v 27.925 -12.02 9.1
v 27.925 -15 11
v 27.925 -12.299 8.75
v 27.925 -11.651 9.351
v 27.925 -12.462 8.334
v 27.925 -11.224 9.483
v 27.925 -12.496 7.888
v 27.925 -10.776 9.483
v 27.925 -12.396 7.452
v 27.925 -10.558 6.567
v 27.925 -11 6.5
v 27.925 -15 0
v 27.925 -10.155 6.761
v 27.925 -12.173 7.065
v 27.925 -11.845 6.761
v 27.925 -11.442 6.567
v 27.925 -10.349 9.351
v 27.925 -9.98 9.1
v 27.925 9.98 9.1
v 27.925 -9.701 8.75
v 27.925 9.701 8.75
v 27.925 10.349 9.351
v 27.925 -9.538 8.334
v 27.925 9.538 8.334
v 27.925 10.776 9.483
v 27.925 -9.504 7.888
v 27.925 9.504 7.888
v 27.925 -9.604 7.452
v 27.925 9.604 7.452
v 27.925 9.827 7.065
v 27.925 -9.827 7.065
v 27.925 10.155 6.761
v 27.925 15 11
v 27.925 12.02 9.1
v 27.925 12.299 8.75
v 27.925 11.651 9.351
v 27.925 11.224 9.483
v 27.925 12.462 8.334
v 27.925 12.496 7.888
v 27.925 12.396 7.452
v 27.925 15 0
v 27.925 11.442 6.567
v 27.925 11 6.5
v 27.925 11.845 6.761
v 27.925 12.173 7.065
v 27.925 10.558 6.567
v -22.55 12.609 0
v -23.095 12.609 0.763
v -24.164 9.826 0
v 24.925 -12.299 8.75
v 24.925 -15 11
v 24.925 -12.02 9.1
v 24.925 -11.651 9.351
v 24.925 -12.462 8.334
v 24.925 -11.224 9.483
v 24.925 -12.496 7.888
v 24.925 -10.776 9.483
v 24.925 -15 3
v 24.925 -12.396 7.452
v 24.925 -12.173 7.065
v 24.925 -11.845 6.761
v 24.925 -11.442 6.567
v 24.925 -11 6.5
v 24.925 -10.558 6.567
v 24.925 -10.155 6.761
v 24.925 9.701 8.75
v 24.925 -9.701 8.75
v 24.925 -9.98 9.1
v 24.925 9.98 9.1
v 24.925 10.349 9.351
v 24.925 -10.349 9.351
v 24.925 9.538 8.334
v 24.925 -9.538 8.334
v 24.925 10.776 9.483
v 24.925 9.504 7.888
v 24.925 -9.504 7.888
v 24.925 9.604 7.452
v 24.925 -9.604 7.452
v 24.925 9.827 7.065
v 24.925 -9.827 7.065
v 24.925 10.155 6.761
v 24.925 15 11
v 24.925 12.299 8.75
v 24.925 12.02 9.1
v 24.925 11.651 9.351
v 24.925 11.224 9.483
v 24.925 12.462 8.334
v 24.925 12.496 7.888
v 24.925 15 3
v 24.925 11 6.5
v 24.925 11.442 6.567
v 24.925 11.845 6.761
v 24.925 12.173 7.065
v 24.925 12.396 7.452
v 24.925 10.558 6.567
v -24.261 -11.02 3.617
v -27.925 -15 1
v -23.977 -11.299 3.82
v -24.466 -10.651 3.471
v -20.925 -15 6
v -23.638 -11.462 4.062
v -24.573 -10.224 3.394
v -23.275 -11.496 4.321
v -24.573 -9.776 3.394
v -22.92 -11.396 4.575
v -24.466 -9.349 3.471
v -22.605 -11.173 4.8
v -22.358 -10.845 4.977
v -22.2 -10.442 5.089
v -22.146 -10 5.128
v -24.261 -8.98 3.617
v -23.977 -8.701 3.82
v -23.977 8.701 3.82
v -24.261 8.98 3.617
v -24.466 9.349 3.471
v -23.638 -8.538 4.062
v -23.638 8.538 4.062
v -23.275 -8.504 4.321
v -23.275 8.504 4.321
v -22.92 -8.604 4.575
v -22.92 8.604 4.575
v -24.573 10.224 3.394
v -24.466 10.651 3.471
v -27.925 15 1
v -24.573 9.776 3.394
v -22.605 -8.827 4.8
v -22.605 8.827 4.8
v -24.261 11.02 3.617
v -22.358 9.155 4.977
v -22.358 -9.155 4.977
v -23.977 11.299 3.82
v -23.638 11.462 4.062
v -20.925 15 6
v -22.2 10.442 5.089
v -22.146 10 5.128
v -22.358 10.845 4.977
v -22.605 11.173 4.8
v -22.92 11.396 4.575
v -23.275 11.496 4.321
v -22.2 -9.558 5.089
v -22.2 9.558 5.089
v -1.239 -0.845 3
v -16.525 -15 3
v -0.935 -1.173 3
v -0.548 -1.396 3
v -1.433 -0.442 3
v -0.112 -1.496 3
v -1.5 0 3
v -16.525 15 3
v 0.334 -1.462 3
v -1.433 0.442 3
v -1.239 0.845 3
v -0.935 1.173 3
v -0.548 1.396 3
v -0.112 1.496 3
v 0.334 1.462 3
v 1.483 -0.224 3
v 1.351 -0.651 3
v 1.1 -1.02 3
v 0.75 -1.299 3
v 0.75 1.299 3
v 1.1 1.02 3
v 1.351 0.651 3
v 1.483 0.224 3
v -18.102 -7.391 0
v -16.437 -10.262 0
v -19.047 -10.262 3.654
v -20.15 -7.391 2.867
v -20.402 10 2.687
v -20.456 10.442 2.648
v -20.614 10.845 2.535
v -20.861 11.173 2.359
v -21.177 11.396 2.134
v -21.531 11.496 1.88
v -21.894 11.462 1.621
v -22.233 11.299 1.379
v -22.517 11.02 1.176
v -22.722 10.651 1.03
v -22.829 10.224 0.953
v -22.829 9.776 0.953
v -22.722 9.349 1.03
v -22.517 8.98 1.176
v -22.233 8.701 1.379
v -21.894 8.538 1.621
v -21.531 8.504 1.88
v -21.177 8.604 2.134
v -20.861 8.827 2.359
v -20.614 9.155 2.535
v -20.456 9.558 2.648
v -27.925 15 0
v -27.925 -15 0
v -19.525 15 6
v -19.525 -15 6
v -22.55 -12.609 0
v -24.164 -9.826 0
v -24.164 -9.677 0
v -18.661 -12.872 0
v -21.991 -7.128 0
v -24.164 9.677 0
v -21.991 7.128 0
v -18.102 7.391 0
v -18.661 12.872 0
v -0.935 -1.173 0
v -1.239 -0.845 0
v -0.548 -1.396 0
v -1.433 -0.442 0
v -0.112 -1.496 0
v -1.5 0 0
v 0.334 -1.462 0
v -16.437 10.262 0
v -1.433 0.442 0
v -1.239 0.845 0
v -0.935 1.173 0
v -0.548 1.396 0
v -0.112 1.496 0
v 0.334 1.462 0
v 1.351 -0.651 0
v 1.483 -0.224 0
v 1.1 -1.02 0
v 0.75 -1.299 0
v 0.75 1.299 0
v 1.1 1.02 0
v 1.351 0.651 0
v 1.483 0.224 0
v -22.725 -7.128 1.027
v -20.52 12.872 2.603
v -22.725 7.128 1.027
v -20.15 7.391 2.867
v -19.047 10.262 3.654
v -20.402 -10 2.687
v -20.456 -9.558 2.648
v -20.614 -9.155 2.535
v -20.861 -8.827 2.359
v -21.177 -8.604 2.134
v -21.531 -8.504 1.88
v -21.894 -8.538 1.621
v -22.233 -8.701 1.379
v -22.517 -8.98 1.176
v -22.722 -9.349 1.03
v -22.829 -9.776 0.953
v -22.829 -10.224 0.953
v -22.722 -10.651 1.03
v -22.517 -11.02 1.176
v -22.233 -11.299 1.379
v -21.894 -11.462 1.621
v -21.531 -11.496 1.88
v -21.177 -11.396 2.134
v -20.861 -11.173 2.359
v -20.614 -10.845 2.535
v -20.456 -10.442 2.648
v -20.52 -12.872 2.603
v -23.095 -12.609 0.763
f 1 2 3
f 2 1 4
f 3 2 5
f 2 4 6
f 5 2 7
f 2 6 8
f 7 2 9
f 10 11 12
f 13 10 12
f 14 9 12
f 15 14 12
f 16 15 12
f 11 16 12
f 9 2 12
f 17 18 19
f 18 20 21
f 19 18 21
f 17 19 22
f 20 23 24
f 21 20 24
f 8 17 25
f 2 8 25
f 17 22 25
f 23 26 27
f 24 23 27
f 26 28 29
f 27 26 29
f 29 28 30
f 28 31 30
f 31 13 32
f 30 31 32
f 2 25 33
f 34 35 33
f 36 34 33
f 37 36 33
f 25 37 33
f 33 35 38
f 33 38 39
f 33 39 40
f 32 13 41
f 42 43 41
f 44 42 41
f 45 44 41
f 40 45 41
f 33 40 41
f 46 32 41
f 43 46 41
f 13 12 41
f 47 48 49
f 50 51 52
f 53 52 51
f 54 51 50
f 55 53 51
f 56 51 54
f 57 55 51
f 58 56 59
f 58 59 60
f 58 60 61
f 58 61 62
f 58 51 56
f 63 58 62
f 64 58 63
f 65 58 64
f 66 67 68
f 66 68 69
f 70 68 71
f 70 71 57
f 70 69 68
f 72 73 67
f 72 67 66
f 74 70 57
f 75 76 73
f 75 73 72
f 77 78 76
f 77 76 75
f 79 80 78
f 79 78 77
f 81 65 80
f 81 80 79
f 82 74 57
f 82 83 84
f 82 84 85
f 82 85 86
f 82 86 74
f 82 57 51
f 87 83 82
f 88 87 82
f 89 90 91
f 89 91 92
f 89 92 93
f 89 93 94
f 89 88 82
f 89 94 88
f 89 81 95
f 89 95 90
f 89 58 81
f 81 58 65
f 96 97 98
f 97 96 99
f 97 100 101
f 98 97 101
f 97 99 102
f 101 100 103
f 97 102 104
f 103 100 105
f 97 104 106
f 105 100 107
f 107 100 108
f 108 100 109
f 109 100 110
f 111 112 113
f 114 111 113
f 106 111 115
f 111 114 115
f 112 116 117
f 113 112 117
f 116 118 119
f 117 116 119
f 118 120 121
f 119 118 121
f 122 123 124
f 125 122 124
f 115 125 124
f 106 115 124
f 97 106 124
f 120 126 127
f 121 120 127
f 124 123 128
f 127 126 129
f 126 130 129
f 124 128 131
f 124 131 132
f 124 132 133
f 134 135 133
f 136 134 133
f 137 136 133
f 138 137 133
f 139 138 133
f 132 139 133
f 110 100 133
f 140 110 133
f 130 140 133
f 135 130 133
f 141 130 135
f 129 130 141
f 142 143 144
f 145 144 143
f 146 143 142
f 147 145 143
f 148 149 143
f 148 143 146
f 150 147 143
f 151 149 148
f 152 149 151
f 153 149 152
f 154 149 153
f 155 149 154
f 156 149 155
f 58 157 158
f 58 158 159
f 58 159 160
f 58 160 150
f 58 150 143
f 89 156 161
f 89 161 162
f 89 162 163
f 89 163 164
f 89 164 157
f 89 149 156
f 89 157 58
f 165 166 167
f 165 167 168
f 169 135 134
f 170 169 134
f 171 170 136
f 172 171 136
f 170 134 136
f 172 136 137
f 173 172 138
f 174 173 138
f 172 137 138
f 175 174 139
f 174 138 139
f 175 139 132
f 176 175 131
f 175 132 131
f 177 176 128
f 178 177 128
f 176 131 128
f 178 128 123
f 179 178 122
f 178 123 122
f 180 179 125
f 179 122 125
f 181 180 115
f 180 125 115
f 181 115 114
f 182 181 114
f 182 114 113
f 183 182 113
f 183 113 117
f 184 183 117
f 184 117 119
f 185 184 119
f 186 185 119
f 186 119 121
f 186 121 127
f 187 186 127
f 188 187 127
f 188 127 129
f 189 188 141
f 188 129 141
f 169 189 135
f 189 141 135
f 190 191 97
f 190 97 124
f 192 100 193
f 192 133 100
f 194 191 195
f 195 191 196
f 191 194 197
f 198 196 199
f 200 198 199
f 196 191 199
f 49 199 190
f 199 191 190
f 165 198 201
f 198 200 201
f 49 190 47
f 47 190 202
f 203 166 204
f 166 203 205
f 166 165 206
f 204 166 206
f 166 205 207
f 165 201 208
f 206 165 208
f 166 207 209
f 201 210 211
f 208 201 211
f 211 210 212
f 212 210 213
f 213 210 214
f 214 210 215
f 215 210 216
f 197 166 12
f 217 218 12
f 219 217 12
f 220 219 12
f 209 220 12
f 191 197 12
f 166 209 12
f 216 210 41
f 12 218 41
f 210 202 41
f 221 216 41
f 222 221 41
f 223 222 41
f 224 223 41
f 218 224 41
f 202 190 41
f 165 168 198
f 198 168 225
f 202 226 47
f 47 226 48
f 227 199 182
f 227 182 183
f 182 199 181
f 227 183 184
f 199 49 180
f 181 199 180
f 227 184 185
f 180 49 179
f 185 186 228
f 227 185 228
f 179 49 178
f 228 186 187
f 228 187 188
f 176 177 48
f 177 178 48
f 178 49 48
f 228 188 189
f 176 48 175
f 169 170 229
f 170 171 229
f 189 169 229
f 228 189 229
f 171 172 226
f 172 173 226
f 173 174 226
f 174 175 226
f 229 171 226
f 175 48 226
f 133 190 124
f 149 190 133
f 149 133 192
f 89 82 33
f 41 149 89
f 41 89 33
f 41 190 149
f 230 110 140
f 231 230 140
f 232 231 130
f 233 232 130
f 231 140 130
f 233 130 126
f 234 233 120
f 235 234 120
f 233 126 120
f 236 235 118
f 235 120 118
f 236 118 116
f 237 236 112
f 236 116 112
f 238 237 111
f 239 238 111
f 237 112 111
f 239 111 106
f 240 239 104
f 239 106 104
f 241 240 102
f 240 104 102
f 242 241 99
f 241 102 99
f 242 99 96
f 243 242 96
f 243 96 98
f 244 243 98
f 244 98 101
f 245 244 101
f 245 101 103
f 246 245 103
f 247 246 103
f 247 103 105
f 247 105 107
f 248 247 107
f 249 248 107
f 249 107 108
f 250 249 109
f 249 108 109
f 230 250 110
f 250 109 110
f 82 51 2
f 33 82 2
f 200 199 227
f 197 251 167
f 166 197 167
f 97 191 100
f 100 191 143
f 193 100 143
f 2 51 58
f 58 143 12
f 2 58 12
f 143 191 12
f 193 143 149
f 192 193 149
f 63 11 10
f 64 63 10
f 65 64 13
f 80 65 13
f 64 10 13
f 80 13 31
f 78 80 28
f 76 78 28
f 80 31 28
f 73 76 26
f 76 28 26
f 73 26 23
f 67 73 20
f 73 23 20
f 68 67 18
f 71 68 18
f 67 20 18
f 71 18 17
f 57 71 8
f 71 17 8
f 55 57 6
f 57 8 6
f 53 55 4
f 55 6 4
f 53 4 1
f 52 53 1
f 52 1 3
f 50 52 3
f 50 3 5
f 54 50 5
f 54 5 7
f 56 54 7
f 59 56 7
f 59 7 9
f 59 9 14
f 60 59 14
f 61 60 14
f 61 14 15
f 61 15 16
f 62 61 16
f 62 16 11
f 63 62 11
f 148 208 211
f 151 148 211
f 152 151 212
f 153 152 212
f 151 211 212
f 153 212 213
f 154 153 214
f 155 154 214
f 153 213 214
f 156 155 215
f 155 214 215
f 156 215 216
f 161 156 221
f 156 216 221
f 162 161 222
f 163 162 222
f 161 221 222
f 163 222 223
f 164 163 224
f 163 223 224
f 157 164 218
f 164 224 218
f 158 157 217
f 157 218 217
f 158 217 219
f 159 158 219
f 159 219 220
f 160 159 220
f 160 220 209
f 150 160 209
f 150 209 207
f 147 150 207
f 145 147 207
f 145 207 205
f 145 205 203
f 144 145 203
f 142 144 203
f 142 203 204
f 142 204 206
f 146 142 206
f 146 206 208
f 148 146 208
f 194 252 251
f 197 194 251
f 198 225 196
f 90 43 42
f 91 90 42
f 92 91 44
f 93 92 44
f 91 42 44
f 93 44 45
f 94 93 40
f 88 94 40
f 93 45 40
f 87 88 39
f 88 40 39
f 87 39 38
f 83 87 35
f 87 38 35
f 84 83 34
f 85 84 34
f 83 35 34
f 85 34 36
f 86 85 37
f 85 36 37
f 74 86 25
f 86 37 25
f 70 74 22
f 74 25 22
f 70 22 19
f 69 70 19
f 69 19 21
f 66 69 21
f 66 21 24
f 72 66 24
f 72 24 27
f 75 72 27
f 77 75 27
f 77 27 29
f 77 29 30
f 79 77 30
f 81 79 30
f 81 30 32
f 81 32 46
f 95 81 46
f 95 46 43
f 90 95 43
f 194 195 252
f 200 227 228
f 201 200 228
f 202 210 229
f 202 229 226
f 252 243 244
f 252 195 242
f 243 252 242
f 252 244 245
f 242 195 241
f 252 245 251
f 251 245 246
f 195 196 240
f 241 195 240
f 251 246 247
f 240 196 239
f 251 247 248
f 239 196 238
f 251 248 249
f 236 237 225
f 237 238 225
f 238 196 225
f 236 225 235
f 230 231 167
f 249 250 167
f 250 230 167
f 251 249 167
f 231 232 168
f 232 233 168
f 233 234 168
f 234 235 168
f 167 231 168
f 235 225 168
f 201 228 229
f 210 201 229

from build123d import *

# Parameters (mm, degrees)
SKETCH1_W           = 55.85
SKETCH1_H           = 30
BOSS_EXTRUDE1_DEPTH = 3
SKETCH2_W           = 8.4
SKETCH2_H           = 30
BOSS_EXTRUDE2_DEPTH = 3
CHAMFER1_SIZE       = 5
CHAMFER1_SIZE2      = 7
SKETCH3_R           = 1.5
CUT_EXTRUDE1_DEPTH  = 3
CHAMFER2_SIZE       = 3
CUT_EXTRUDE2_START  = -3
CUT_EXTRUDE2_DEPTH  = 8
SKETCH5_W           = 3
SKETCH5_H           = 30
BOSS_EXTRUDE3_DEPTH = 8
SKETCH6_R           = 1.5
CUT_EXTRUDE3_DEPTH  = 8
SKETCH7_R           = 1.5
CUT_EXTRUDE4_DEPTH  = 34.553027062


with BuildPart() as part:
    # Sketch1 → Boss-Extrude1 (new body)
    with BuildSketch(Plane.XY):
        Rectangle(SKETCH1_W, SKETCH1_H)
    extrude(amount=BOSS_EXTRUDE1_DEPTH)

    # Sketch2 → Boss-Extrude2 (add)
    with BuildSketch(Plane.XY.offset(3)):
        with Locations((-23.725, 0)):
            Rectangle(SKETCH2_W, SKETCH2_H)
    extrude(amount=BOSS_EXTRUDE2_DEPTH)

    # Chamfer1
    chamfer1_edges = [part.edges().sort_by_distance(p)[0] for p in [
        (-27.925, 0, 6),
    ]]
    chamfer1_side = [part.faces().sort_by_distance(p)[0] for p in [
        (-27.925, 0, 3),
    ]]
    chamfer(chamfer1_edges, length=CHAMFER1_SIZE, length2=CHAMFER1_SIZE2, reference=chamfer1_side[0])

    # Sketch3 → Cut-Extrude1 (cut)
    with BuildSketch(Plane(origin=(-9.907094595, 0, 13.869932432), x_dir=(0.8137334712067354, 0, 0.5812381937190957), z_dir=(-0.5812381937190957, 0, 0.8137334712067354))):
        with Locations((-16.539943723, 10)):
            Circle(SKETCH3_R)
        with Locations((-16.539943723, -10)):
            Circle(SKETCH3_R)
    extrude(amount=-CUT_EXTRUDE1_DEPTH, mode=Mode.SUBTRACT)

    # Chamfer2
    chamfer2_edges = [part.edges().sort_by_distance(p)[0] for p in [
        (-19.525, 0, 3),
    ]]
    chamfer(chamfer2_edges, length=CHAMFER2_SIZE - 0.0001)  # a hair under: the kernel refuses the full size

    # Sketch4 → Cut-Extrude2 (cut)
    with BuildSketch(Plane(origin=(-9.907094595, 0, 13.869932432), x_dir=(0.8137334712067354, 0, 0.5812381937190959), z_dir=(-0.5812381937190958, 0, 0.8137334712067353)).offset(CUT_EXTRUDE2_START)):
        Polygon((-14.730494791, 7.39055027), (-13.3753695, 10.262303877), (-15.184818432, 12.871753607), (-18.349392655, 12.60944973), (-19.704517945, 9.737696123), (-17.895069013, 7.128246393), align=None)
        Polygon((-14.730494791, -7.39055027), (-17.895069013, -7.128246393), (-19.704517945, -9.737696123), (-18.349392655, -12.60944973), (-15.184818432, -12.871753607), (-13.3753695, -10.262303877), align=None)
    extrude(amount=-CUT_EXTRUDE2_DEPTH, mode=Mode.SUBTRACT)

    # Sketch5 → Boss-Extrude3 (add)
    with BuildSketch(Plane.XY.offset(3)):
        with Locations((26.425, 0)):
            Rectangle(SKETCH5_W, SKETCH5_H)
    extrude(amount=BOSS_EXTRUDE3_DEPTH)

    # Sketch6 → Cut-Extrude3 (cut)
    with BuildSketch(Plane(origin=(27.925, 0, 0), x_dir=(0, 0, -1), z_dir=(1, 0, 0))):
        with Locations((-8, 11)):
            Circle(SKETCH6_R)
        with Locations((-8, -11)):
            Circle(SKETCH6_R)
    extrude(amount=-CUT_EXTRUDE3_DEPTH, mode=Mode.SUBTRACT)

    # Sketch7 → Cut-Extrude4 (cut, through all)
    with BuildSketch(Plane(origin=(0, 0, 0), x_dir=(-1, 0, 0), z_dir=(0, 0, -1))):
        Circle(SKETCH7_R)
    extrude(amount=-CUT_EXTRUDE4_DEPTH, mode=Mode.SUBTRACT)


solid = part.part
